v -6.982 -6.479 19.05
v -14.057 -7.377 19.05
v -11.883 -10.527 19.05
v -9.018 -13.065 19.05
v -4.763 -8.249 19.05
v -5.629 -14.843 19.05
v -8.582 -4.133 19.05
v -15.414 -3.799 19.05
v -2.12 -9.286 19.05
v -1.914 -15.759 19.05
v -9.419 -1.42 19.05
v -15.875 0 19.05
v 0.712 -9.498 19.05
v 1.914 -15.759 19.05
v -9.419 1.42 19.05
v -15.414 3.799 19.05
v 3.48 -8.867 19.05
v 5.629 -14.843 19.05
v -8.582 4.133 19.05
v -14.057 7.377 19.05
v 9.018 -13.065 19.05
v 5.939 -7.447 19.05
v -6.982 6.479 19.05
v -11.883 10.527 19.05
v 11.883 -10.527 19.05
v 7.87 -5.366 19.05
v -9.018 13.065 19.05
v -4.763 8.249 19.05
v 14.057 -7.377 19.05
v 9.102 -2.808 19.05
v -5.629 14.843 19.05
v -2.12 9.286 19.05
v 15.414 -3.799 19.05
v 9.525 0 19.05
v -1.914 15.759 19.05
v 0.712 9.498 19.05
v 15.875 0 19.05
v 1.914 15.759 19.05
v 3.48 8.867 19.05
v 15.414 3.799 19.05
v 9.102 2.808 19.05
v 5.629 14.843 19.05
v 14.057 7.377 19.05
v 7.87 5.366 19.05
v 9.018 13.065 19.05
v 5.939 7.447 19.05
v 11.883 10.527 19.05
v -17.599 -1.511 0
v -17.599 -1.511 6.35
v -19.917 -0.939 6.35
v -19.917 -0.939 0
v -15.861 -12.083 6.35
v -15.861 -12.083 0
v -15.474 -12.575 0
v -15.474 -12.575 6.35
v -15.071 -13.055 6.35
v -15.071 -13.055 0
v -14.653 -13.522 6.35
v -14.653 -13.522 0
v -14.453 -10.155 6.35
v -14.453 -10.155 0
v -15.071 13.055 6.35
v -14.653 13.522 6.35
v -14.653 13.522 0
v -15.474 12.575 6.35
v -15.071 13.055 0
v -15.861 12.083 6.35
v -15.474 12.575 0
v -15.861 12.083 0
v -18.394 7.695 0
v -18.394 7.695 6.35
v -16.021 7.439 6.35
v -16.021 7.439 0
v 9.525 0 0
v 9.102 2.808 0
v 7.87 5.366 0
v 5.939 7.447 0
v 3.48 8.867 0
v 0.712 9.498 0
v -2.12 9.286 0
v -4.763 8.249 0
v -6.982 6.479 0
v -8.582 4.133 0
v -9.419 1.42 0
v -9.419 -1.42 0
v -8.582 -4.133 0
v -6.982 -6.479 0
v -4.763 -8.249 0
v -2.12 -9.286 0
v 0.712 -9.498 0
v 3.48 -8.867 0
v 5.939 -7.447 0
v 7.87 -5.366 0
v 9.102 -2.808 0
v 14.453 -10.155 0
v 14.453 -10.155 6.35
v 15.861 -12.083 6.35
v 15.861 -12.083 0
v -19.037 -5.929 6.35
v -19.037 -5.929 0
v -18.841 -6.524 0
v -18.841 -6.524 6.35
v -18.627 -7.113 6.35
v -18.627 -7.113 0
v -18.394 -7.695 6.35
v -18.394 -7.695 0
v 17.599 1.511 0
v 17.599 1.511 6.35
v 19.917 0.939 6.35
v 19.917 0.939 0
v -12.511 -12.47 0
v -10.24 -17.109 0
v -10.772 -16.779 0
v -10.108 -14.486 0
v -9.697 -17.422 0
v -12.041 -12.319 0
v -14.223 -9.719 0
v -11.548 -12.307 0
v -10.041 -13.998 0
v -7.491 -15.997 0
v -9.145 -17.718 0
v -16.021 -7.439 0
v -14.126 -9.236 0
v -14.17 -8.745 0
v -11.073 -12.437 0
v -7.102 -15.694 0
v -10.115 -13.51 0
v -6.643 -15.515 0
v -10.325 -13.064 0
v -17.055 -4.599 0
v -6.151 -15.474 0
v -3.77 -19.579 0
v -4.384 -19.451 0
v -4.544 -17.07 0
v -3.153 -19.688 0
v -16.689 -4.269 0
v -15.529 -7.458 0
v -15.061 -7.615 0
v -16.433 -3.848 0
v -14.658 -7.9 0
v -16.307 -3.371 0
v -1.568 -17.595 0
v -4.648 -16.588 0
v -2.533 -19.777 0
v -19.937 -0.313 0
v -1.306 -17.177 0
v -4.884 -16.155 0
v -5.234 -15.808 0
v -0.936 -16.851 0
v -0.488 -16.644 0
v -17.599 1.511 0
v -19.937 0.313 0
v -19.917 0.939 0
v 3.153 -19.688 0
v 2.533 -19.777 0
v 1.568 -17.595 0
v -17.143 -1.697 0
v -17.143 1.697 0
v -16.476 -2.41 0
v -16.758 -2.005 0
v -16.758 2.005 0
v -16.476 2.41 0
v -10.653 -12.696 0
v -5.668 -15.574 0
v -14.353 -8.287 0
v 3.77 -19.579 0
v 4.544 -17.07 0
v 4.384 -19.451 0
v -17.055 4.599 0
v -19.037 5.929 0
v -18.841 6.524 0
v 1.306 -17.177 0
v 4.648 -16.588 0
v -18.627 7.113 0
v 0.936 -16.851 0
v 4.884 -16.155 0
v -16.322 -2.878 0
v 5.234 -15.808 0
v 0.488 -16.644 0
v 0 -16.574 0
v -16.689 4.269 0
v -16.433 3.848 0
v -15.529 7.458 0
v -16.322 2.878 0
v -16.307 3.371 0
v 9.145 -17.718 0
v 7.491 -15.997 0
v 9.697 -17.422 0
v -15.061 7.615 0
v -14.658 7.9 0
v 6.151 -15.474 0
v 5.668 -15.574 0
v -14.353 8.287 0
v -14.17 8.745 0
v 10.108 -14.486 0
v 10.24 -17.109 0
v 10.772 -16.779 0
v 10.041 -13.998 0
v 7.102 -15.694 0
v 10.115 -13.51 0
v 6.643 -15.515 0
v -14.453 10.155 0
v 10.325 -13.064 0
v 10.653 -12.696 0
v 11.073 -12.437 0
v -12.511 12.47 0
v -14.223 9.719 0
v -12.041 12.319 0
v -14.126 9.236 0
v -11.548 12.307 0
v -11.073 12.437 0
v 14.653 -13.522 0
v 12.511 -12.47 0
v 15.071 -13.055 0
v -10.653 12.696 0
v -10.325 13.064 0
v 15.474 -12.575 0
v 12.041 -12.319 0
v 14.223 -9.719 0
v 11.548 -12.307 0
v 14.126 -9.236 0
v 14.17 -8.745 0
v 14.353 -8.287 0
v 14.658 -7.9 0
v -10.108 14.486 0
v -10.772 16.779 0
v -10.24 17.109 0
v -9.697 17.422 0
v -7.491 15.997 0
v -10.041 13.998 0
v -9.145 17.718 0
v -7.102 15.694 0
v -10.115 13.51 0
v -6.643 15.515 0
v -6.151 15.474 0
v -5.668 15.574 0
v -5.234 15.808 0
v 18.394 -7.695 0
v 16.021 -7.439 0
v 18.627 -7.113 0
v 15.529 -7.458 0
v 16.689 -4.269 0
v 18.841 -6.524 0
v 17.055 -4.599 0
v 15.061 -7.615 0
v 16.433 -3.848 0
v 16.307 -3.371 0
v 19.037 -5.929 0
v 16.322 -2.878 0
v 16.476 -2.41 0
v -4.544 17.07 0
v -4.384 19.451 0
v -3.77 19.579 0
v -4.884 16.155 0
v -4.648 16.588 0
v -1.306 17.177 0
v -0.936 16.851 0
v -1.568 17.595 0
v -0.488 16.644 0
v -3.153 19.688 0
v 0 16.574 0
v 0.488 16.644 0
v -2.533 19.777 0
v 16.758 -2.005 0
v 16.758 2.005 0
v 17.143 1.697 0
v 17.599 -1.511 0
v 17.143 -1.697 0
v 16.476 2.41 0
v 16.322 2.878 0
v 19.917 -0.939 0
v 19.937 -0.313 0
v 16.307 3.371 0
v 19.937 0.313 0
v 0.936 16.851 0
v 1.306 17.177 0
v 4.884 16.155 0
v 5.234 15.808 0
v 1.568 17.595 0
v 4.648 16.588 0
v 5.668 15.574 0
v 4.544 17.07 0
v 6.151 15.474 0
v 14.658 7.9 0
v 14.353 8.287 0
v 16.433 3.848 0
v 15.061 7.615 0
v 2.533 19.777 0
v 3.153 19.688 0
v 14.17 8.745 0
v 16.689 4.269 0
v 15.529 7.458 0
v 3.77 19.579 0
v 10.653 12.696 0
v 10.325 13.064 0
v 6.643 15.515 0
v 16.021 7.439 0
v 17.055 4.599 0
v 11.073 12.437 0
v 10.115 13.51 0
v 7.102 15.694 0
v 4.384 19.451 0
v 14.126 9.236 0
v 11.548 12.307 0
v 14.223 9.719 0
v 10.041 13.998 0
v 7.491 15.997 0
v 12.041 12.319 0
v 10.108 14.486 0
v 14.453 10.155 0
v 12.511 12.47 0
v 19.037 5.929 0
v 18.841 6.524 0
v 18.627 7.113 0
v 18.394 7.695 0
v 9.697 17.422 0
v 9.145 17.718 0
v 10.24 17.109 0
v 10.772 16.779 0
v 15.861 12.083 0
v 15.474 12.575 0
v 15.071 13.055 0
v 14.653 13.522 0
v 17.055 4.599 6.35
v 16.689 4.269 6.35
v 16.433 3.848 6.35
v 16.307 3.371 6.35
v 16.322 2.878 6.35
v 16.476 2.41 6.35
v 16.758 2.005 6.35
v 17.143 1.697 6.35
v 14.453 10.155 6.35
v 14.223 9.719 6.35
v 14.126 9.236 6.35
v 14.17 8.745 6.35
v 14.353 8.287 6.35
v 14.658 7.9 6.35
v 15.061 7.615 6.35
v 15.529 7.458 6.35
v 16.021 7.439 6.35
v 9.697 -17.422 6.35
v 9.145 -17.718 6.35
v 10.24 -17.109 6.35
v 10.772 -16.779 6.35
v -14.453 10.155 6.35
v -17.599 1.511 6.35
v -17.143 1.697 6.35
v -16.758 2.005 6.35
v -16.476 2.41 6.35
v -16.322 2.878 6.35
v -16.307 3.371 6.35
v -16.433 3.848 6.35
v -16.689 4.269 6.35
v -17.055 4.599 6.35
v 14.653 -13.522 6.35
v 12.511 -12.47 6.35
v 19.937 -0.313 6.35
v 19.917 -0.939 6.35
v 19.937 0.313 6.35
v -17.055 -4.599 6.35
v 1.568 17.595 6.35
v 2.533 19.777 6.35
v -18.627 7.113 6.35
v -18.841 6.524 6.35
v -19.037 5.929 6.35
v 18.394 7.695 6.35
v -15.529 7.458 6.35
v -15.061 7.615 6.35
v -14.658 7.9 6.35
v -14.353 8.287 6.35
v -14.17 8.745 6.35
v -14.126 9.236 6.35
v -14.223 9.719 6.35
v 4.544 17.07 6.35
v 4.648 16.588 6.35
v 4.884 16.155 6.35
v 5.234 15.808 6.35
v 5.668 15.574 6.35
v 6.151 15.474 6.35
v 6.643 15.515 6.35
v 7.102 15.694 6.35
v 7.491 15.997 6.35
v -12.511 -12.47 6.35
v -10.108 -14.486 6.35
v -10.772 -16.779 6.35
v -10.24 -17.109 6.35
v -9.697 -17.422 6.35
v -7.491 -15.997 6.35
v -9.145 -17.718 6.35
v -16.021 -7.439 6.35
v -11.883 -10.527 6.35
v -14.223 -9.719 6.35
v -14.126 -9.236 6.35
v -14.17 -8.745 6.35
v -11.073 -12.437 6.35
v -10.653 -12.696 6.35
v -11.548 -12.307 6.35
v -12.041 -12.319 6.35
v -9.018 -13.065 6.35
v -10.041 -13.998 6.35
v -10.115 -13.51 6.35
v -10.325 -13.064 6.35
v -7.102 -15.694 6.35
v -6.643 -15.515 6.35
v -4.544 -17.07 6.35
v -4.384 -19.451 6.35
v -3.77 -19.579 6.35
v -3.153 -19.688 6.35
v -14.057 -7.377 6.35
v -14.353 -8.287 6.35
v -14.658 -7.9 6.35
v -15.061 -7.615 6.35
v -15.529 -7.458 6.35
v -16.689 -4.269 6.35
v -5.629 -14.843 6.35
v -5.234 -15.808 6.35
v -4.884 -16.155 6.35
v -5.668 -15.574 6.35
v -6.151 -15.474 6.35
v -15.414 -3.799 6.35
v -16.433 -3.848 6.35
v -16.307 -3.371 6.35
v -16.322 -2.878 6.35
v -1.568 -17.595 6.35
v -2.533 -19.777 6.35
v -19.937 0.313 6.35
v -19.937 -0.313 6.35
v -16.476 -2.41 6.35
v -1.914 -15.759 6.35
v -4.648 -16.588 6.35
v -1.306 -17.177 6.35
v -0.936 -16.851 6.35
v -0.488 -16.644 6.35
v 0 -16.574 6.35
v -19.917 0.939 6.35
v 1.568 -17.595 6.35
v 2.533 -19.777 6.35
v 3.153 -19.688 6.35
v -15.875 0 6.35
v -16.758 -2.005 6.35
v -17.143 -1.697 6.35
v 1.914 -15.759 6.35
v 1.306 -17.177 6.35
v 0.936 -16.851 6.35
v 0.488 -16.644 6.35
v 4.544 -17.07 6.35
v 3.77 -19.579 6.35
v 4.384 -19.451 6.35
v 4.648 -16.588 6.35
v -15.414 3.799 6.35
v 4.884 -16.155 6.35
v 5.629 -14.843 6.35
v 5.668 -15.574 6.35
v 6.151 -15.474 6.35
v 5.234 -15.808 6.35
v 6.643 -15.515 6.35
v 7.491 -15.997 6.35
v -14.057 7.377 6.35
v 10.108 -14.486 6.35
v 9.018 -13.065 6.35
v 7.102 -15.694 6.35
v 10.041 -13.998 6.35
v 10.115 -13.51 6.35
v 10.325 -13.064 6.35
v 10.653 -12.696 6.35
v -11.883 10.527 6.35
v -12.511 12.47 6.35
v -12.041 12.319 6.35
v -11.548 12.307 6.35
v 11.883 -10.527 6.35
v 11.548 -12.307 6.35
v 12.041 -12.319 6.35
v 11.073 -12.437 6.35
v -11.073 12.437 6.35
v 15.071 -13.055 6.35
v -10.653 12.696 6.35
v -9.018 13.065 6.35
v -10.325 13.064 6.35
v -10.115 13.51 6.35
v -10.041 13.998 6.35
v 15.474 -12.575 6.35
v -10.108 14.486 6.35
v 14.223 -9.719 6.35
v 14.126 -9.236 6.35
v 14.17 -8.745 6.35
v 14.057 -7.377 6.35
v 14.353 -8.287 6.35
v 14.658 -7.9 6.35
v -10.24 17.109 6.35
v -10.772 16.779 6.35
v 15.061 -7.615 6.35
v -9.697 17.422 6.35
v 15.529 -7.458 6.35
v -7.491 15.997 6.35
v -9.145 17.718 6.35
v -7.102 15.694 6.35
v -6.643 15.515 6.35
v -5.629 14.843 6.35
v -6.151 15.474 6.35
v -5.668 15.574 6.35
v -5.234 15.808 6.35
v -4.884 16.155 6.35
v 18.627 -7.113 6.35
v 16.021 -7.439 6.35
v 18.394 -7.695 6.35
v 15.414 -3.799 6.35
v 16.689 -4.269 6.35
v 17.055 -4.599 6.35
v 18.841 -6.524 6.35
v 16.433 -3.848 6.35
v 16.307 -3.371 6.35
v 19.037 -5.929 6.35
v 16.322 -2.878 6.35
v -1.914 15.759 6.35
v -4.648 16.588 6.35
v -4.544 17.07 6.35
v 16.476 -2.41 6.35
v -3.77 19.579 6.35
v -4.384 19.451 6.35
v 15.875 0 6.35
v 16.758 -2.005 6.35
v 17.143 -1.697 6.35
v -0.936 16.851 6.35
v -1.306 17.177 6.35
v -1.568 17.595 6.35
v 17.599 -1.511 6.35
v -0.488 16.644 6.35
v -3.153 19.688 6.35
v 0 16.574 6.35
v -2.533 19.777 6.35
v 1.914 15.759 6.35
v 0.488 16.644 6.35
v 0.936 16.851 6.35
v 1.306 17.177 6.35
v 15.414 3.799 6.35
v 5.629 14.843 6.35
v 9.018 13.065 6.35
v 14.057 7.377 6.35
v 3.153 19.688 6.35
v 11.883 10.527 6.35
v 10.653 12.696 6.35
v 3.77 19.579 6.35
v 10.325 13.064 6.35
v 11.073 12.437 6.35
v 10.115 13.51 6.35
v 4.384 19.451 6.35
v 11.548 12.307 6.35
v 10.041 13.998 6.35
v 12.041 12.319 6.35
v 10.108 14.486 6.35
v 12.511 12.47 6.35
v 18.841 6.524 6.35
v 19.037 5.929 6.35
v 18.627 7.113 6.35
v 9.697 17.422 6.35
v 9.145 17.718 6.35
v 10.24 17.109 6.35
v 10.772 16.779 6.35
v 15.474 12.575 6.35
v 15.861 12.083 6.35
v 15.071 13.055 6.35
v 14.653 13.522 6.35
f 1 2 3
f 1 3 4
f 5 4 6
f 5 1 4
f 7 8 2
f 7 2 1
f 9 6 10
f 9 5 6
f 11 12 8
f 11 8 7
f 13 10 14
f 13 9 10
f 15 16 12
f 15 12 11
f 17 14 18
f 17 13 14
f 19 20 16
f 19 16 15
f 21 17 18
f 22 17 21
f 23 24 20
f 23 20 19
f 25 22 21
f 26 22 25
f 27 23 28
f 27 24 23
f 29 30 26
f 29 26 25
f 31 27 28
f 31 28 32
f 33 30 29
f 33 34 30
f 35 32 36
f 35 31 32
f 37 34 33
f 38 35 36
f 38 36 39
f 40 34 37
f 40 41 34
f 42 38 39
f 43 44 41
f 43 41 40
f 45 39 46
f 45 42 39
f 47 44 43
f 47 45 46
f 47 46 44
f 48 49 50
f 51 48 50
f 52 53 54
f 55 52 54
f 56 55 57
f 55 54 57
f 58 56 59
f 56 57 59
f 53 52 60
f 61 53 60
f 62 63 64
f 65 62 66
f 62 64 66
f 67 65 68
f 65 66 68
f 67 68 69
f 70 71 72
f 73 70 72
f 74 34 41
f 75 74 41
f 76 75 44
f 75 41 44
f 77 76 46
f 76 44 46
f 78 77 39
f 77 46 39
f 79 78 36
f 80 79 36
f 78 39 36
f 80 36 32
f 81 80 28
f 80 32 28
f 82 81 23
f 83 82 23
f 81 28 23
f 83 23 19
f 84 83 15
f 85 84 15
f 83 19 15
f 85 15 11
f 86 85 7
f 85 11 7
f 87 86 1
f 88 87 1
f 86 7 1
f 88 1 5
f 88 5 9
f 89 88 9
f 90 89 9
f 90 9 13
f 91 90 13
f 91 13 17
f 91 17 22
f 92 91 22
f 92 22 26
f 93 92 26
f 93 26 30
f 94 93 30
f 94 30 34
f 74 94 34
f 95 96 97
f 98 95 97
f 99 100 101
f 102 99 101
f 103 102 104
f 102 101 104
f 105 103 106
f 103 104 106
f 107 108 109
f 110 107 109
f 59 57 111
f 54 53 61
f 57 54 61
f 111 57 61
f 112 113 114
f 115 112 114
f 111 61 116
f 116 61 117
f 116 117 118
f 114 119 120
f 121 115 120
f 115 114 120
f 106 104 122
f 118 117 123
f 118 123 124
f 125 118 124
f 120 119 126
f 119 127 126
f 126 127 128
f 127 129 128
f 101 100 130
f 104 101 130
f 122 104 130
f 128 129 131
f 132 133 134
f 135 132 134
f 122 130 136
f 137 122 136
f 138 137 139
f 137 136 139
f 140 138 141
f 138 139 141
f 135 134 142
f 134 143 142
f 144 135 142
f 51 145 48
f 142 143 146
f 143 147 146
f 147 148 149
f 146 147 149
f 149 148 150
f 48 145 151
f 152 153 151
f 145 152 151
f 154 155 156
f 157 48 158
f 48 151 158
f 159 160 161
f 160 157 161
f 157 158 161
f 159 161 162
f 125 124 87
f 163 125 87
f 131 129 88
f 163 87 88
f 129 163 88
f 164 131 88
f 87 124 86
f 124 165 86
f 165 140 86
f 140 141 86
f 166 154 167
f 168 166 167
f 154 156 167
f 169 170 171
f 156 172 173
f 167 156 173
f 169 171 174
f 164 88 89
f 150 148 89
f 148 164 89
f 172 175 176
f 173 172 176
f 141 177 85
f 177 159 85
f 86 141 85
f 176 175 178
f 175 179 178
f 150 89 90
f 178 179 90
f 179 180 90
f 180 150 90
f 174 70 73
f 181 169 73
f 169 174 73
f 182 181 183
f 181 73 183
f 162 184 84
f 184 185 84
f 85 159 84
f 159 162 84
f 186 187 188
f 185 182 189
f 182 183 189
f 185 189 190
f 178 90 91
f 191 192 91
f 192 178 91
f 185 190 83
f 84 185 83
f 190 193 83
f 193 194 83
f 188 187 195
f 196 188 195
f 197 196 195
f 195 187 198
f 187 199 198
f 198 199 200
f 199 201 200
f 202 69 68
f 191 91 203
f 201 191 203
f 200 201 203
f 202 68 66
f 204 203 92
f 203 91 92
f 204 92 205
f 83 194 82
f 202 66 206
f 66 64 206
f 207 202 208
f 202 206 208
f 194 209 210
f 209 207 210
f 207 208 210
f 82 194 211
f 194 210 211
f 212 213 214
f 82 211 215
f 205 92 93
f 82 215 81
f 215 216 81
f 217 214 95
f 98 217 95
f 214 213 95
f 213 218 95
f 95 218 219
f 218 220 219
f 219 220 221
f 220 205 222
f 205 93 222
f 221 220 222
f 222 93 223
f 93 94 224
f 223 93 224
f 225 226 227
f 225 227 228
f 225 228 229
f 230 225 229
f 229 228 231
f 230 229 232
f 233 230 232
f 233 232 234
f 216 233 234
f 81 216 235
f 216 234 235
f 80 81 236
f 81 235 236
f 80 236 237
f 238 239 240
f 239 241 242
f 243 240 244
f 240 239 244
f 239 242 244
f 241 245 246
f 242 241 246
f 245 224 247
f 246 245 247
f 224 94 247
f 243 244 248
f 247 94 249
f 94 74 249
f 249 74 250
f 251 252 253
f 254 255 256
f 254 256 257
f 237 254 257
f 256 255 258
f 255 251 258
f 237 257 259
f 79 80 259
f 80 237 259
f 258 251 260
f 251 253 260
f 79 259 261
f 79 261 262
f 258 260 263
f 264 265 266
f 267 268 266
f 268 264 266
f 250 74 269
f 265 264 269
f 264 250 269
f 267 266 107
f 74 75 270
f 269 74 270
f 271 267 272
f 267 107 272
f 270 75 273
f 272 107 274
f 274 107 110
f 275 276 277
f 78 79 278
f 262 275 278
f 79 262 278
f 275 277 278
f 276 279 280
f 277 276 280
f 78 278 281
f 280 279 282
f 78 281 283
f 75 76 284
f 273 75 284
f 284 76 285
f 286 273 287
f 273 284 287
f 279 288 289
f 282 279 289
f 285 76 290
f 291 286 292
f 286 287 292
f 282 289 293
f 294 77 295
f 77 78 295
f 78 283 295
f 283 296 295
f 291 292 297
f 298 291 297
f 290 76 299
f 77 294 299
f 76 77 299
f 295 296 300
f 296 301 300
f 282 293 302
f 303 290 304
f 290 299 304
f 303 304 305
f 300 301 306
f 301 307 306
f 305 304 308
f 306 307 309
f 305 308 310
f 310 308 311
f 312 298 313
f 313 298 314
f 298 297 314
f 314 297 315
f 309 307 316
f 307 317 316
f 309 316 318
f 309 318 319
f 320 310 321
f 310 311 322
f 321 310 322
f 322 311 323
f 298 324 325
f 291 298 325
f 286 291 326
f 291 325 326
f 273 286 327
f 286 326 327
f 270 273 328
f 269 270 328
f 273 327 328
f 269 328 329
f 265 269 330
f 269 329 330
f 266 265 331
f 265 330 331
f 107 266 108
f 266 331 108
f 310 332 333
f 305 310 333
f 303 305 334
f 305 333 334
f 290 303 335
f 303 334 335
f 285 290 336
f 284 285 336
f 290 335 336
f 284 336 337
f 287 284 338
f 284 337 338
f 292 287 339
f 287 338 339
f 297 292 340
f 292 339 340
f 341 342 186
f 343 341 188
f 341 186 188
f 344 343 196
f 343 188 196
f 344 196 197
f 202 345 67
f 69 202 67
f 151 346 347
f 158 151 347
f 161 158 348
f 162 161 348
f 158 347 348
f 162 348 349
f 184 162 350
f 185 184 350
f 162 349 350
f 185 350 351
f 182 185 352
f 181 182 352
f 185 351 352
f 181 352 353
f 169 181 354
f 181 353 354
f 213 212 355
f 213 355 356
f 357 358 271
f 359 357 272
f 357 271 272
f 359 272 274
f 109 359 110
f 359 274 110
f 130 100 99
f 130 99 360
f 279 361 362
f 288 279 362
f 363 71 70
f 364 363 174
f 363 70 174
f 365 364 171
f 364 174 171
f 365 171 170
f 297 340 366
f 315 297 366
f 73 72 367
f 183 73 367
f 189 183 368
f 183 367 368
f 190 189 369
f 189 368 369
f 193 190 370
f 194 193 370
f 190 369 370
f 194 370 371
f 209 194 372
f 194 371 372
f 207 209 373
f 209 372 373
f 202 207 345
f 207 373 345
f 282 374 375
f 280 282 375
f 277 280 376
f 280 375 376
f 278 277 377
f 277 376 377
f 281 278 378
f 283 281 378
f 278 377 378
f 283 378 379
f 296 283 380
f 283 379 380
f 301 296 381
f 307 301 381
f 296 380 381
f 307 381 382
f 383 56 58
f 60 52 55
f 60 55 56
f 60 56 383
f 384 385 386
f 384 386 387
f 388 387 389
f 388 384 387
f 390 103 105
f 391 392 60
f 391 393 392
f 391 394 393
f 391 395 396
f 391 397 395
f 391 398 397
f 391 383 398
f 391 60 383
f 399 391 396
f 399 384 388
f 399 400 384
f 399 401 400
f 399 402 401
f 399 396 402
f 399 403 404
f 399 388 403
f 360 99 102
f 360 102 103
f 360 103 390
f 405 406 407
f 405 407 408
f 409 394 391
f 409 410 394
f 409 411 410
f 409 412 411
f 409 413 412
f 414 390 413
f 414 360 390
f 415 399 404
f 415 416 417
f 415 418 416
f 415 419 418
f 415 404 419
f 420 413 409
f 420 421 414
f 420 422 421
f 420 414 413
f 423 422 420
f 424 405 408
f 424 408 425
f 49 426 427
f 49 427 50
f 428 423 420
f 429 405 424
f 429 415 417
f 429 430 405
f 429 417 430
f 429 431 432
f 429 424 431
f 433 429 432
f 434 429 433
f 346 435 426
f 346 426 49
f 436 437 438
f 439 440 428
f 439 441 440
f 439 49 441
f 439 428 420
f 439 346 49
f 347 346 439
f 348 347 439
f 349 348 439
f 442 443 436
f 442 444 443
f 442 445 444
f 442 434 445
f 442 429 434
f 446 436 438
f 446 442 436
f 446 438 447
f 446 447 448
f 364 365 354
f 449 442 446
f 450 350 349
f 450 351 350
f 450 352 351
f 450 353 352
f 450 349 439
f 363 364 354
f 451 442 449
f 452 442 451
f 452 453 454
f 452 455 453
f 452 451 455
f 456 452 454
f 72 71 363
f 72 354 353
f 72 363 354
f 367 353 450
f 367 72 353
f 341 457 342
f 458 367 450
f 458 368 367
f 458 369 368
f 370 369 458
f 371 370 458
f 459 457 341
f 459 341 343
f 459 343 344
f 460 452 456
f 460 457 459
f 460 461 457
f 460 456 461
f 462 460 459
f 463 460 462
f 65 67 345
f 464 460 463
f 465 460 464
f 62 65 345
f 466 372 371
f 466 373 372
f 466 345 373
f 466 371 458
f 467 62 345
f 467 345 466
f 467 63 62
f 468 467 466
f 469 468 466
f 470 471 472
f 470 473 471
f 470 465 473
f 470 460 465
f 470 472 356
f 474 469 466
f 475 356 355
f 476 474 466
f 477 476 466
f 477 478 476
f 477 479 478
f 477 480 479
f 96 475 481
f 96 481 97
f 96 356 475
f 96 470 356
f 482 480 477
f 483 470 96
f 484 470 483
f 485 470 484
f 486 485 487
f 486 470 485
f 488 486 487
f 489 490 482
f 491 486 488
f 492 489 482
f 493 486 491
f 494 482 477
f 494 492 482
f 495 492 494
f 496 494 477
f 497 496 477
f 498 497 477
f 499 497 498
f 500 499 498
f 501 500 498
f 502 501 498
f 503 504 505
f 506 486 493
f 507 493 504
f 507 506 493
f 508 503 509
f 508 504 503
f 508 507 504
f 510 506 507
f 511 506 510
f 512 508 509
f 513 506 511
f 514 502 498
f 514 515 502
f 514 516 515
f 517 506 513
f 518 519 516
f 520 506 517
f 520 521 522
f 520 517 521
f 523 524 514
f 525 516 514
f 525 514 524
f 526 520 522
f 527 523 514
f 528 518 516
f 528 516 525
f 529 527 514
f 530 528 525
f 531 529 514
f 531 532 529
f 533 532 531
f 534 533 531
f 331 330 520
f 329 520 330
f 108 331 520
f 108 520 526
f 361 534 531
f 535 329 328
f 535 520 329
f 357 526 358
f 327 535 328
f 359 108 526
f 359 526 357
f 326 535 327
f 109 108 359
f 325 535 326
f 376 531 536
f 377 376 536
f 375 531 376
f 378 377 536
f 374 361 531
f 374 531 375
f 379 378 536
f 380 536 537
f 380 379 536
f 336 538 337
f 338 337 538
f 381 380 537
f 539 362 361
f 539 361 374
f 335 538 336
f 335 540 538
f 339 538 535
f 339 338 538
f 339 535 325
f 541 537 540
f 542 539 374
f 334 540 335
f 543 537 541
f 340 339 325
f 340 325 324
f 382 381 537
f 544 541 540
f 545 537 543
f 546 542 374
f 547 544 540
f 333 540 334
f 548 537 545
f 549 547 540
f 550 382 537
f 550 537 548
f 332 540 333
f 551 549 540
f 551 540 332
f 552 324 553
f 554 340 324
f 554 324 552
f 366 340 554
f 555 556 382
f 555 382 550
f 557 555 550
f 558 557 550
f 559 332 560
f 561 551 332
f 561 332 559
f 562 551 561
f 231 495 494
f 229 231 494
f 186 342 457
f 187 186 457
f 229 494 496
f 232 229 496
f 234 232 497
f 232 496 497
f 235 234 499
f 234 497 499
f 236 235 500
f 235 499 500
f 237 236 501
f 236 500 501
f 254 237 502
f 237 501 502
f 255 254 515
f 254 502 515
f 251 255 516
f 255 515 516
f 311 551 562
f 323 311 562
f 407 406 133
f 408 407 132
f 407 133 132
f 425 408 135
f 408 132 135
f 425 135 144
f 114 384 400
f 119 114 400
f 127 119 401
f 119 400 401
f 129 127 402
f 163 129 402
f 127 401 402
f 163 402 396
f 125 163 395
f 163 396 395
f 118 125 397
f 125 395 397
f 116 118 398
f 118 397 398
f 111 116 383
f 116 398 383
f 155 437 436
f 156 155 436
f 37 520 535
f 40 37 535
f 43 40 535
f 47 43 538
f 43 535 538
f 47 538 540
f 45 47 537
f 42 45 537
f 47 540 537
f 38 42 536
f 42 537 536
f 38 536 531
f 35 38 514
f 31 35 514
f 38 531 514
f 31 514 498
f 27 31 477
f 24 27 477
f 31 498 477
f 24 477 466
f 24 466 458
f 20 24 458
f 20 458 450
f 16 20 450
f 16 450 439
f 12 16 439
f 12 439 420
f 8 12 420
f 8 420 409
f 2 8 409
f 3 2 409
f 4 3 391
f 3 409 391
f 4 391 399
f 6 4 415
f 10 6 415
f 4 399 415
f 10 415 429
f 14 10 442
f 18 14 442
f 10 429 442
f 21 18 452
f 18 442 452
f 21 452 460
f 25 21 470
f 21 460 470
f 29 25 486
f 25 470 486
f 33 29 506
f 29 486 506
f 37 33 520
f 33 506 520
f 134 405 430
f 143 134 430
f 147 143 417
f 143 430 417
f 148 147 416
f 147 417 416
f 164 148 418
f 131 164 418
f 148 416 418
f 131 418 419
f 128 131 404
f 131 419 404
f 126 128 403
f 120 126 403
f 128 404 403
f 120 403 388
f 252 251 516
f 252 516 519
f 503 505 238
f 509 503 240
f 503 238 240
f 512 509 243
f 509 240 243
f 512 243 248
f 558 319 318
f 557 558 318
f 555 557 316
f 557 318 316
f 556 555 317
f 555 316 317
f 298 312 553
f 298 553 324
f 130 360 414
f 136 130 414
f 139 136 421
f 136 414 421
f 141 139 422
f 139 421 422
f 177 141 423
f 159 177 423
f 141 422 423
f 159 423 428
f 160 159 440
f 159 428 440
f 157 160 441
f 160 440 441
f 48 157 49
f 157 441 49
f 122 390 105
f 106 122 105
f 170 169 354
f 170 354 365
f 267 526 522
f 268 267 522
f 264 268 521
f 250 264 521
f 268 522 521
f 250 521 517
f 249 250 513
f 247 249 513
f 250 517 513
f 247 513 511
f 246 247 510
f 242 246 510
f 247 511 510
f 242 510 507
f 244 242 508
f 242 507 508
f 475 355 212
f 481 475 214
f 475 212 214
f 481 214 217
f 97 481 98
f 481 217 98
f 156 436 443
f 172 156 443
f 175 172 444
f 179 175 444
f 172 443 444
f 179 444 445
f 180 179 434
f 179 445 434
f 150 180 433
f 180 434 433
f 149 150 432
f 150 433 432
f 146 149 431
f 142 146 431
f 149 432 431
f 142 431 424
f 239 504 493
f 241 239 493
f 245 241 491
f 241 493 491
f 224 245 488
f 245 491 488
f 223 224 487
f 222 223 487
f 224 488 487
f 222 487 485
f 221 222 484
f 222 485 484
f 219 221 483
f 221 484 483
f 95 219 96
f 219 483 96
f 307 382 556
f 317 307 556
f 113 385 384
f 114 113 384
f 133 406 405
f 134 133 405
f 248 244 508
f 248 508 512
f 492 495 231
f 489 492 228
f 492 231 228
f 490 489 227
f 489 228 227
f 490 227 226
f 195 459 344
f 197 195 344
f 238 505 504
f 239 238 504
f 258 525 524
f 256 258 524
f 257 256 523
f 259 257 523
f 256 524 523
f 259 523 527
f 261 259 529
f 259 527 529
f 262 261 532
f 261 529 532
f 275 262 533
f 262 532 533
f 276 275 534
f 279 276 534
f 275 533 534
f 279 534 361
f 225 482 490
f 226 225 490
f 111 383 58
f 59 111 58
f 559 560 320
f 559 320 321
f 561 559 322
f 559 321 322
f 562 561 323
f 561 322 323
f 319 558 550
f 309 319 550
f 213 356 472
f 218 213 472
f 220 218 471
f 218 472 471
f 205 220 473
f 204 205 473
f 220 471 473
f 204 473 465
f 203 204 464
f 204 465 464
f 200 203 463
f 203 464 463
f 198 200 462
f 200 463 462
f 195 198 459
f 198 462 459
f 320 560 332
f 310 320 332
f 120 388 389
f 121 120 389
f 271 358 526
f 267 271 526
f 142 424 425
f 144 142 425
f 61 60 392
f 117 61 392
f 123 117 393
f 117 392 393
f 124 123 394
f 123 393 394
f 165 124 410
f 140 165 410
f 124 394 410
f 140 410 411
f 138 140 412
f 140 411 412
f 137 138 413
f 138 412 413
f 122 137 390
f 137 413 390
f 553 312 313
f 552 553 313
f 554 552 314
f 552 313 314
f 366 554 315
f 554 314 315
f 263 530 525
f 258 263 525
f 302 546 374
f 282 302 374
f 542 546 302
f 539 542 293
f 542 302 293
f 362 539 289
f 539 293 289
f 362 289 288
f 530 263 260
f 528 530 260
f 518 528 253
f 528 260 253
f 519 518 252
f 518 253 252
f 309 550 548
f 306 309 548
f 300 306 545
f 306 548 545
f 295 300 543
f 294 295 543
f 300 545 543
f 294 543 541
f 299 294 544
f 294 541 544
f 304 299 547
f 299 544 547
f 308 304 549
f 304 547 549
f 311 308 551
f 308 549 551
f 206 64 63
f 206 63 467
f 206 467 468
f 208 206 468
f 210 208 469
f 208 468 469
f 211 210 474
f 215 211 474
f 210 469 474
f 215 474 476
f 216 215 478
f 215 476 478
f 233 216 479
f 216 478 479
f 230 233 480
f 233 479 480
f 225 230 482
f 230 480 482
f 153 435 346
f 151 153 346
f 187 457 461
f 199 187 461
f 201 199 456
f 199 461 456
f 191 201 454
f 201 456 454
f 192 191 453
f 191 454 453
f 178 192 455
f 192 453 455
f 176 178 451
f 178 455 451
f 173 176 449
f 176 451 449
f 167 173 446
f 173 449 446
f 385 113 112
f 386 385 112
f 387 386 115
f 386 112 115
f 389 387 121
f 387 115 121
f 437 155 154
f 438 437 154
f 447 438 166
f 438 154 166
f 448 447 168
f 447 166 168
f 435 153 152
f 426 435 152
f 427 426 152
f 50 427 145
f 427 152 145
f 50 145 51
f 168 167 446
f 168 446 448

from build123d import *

# Parameters (mm, degrees)
F0_R     = 19.939
F1_DEPTH = 6.35
F2_R     = 15.875
F3_DEPTH = 12.7
F4_R     = 9.525
F5_DEPTH = 25.4
F7_DEPTH = 25.4


with BuildPart() as f1:
    # F0 (on Top) → F1 (new body)
    with BuildSketch(Plane.XY):
        Circle(F0_R)
    extrude(amount=F1_DEPTH)

    # F2 (on face) → F3 (join)
    with BuildSketch(Plane.XY.offset(6.35)):
        Circle(F2_R)
    extrude(amount=F3_DEPTH)

    # F4 (on face) → F5 (cut)
    with BuildSketch(Plane.XY.offset(19.05)):
        Circle(F4_R)
    extrude(amount=-F5_DEPTH, mode=Mode.SUBTRACT)

    # F6 (on face) → F7 (cut)
    with BuildSketch(Plane.XY.offset(6.35)):
        with BuildLine():
            Line((-2.5334230713, 19.777398427), (-1.5679899251, 17.5945175959))
            ThreePointArc((-1.5679899251, 17.5945175959), (0, 16.5735), (1.5679899251, 17.5945175959))
            Line((1.5679899251, 17.5945175959), (2.5334230713, 19.777398427))
            ThreePointArc((2.5334230713, 19.777398427), (0, 19.939), (-2.5334230713, 19.777398427))
        make_face()
        with BuildLine():
            ThreePointArc((9.1449076101, 17.7181936383), (6.8195396378, 18.7365311659), (4.3836296792, 19.4511570822))
            Line((4.3836296792, 19.4511570822), (4.5442508678, 17.0697224901))
            ThreePointArc((4.5442508678, 17.0697224901), (5.6684708454, 15.5739956506), (7.491107992, 15.9971542122))
            Line((7.491107992, 15.9971542122), (9.1449076101, 17.7181936383))
        make_face()
        with BuildLine():
            ThreePointArc((14.6533813266, 13.521913204), (12.8165421495, 15.2741601513), (10.7719519949, 16.7788191247))
            Line((10.7719519949, 16.7788191247), (10.1083879401, 14.4860669297))
            ThreePointArc((10.1083879401, 14.4860669297), (10.6532404491, 12.696037578), (12.5106878781, 12.4702979377))
            Line((12.5106878781, 12.4702979377), (14.6533813266, 13.521913204))
        make_face()
        with BuildLine():
            ThreePointArc((18.3944409942, 7.6946904752), (17.2676805261, 9.9695), (15.8610179229, 12.0827079518))
            Line((15.8610179229, 12.0827079518), (14.4533042428, 10.155177906))
            ThreePointArc((14.4533042428, 10.155177906), (14.3530720296, 8.28675), (16.0212941679, 7.4393396899))
            Line((16.0212941679, 7.4393396899), (18.3944409942, 7.6946904752))
        make_face()
        with BuildLine():
            ThreePointArc((19.9168596049, 0.9393745136), (19.6360817873, 3.4623710145), (19.0370110058, 5.9292438781))
            Line((19.0370110058, 5.9292438781), (17.0549387459, 4.5994245523))
            ThreePointArc((17.0549387459, 4.5994245523), (16.3217112945, 2.8779580726), (17.5994959321, 1.5110872826))
            Line((17.5994959321, 1.5110872826), (19.9168596049, 0.9393745136))
        make_face()
        with BuildLine():
            ThreePointArc((19.0370110058, -5.9292438781), (19.6360817873, -3.4623710145), (19.9168596049, -0.9393745136))
            Line((19.9168596049, -0.9393745136), (17.5994959321, -1.5110872826))
            ThreePointArc((17.5994959321, -1.5110872826), (16.3217112945, -2.8779580726), (17.0549387459, -4.5994245523))
            Line((17.0549387459, -4.5994245523), (19.0370110058, -5.9292438781))
        make_face()
        with BuildLine():
            ThreePointArc((15.8610179229, -12.0827079518), (17.2676805261, -9.9695), (18.3944409942, -7.6946904752))
            Line((18.3944409942, -7.6946904752), (16.0212941679, -7.4393396899))
            ThreePointArc((16.0212941679, -7.4393396899), (14.3530720296, -8.28675), (14.4533042428, -10.155177906))
            Line((14.4533042428, -10.155177906), (15.8610179229, -12.0827079518))
        make_face()
        with BuildLine():
            ThreePointArc((10.7719519949, -16.7788191247), (12.8165421495, -15.2741601513), (14.6533813266, -13.521913204))
            Line((14.6533813266, -13.521913204), (12.5106878781, -12.4702979377))
            ThreePointArc((12.5106878781, -12.4702979377), (10.6532404491, -12.696037578), (10.1083879401, -14.4860669297))
            Line((10.1083879401, -14.4860669297), (10.7719519949, -16.7788191247))
        make_face()
        with BuildLine():
            ThreePointArc((4.3836296792, -19.4511570822), (6.8195396378, -18.7365311659), (9.1449076101, -17.7181936383))
            Line((9.1449076101, -17.7181936383), (7.491107992, -15.9971542122))
            ThreePointArc((7.491107992, -15.9971542122), (5.6684708454, -15.5739956506), (4.5442508678, -17.0697224901))
            Line((4.5442508678, -17.0697224901), (4.3836296792, -19.4511570822))
        make_face()
        with BuildLine():
            Line((-1.5679899251, -17.5945175959), (-2.5334230713, -19.777398427))
            ThreePointArc((-2.5334230713, -19.777398427), (0, -19.939), (2.5334230713, -19.777398427))
            Line((2.5334230713, -19.777398427), (1.5679899251, -17.5945175959))
            ThreePointArc((1.5679899251, -17.5945175959), (0, -16.5735), (-1.5679899251, -17.5945175959))
        make_face()
        with BuildLine():
            Line((-7.491107992, -15.9971542122), (-9.1449076101, -17.7181936383))
            ThreePointArc((-9.1449076101, -17.7181936383), (-6.8195396378, -18.7365311659), (-4.3836296792, -19.4511570822))
            Line((-4.3836296792, -19.4511570822), (-4.5442508678, -17.0697224901))
            ThreePointArc((-4.5442508678, -17.0697224901), (-5.6684708454, -15.5739956506), (-7.491107992, -15.9971542122))
        make_face()
        with BuildLine():
            Line((-12.5106878781, -12.4702979377), (-14.6533813266, -13.521913204))
            ThreePointArc((-14.6533813266, -13.521913204), (-12.8165421495, -15.2741601513), (-10.7719519949, -16.7788191247))
            Line((-10.7719519949, -16.7788191247), (-10.1083879401, -14.4860669297))
            ThreePointArc((-10.1083879401, -14.4860669297), (-10.6532404491, -12.696037578), (-12.5106878781, -12.4702979377))
        make_face()
        with BuildLine():
            Line((-16.0212941679, -7.4393396899), (-18.3944409942, -7.6946904752))
            ThreePointArc((-18.3944409942, -7.6946904752), (-17.2676805261, -9.9695), (-15.8610179229, -12.0827079518))
            Line((-15.8610179229, -12.0827079518), (-14.4533042428, -10.155177906))
            ThreePointArc((-14.4533042428, -10.155177906), (-14.3530720296, -8.28675), (-16.0212941679, -7.4393396899))
        make_face()
        with BuildLine():
            Line((-17.5994959321, -1.5110872826), (-19.9168596049, -0.9393745136))
            ThreePointArc((-19.9168596049, -0.9393745136), (-19.6360817873, -3.4623710145), (-19.0370110058, -5.9292438781))
            Line((-19.0370110058, -5.9292438781), (-17.0549387459, -4.5994245523))
            ThreePointArc((-17.0549387459, -4.5994245523), (-16.3217112945, -2.8779580726), (-17.5994959321, -1.5110872826))
        make_face()
        with BuildLine():
            Line((-17.0549387459, 4.5994245523), (-19.0370110058, 5.9292438781))
            ThreePointArc((-19.0370110058, 5.9292438781), (-19.6360817873, 3.4623710145), (-19.9168596049, 0.9393745136))
            Line((-19.9168596049, 0.9393745136), (-17.5994959321, 1.5110872826))
            ThreePointArc((-17.5994959321, 1.5110872826), (-16.3217112945, 2.8779580726), (-17.0549387459, 4.5994245523))
        make_face()
        with BuildLine():
            Line((-14.4533042428, 10.155177906), (-15.8610179229, 12.0827079518))
            ThreePointArc((-15.8610179229, 12.0827079518), (-17.2676805261, 9.9695), (-18.3944409942, 7.6946904752))
            Line((-18.3944409942, 7.6946904752), (-16.0212941679, 7.4393396899))
            ThreePointArc((-16.0212941679, 7.4393396899), (-14.3530720296, 8.28675), (-14.4533042428, 10.155177906))
        make_face()
        with BuildLine():
            Line((-10.1083879401, 14.4860669297), (-10.7719519949, 16.7788191247))
            ThreePointArc((-10.7719519949, 16.7788191247), (-12.8165421495, 15.2741601513), (-14.6533813266, 13.521913204))
            Line((-14.6533813266, 13.521913204), (-12.5106878781, 12.4702979377))
            ThreePointArc((-12.5106878781, 12.4702979377), (-10.6532404491, 12.696037578), (-10.1083879401, 14.4860669297))
        make_face()
        with BuildLine():
            Line((-4.5442508678, 17.0697224901), (-4.3836296792, 19.4511570822))
            ThreePointArc((-4.3836296792, 19.4511570822), (-6.8195396378, 18.7365311659), (-9.1449076101, 17.7181936383))
            Line((-9.1449076101, 17.7181936383), (-7.491107992, 15.9971542122))
            ThreePointArc((-7.491107992, 15.9971542122), (-5.6684708454, 15.5739956506), (-4.5442508678, 17.0697224901))
        make_face()
    extrude(amount=-F7_DEPTH, mode=Mode.SUBTRACT)


solid = f1.part
